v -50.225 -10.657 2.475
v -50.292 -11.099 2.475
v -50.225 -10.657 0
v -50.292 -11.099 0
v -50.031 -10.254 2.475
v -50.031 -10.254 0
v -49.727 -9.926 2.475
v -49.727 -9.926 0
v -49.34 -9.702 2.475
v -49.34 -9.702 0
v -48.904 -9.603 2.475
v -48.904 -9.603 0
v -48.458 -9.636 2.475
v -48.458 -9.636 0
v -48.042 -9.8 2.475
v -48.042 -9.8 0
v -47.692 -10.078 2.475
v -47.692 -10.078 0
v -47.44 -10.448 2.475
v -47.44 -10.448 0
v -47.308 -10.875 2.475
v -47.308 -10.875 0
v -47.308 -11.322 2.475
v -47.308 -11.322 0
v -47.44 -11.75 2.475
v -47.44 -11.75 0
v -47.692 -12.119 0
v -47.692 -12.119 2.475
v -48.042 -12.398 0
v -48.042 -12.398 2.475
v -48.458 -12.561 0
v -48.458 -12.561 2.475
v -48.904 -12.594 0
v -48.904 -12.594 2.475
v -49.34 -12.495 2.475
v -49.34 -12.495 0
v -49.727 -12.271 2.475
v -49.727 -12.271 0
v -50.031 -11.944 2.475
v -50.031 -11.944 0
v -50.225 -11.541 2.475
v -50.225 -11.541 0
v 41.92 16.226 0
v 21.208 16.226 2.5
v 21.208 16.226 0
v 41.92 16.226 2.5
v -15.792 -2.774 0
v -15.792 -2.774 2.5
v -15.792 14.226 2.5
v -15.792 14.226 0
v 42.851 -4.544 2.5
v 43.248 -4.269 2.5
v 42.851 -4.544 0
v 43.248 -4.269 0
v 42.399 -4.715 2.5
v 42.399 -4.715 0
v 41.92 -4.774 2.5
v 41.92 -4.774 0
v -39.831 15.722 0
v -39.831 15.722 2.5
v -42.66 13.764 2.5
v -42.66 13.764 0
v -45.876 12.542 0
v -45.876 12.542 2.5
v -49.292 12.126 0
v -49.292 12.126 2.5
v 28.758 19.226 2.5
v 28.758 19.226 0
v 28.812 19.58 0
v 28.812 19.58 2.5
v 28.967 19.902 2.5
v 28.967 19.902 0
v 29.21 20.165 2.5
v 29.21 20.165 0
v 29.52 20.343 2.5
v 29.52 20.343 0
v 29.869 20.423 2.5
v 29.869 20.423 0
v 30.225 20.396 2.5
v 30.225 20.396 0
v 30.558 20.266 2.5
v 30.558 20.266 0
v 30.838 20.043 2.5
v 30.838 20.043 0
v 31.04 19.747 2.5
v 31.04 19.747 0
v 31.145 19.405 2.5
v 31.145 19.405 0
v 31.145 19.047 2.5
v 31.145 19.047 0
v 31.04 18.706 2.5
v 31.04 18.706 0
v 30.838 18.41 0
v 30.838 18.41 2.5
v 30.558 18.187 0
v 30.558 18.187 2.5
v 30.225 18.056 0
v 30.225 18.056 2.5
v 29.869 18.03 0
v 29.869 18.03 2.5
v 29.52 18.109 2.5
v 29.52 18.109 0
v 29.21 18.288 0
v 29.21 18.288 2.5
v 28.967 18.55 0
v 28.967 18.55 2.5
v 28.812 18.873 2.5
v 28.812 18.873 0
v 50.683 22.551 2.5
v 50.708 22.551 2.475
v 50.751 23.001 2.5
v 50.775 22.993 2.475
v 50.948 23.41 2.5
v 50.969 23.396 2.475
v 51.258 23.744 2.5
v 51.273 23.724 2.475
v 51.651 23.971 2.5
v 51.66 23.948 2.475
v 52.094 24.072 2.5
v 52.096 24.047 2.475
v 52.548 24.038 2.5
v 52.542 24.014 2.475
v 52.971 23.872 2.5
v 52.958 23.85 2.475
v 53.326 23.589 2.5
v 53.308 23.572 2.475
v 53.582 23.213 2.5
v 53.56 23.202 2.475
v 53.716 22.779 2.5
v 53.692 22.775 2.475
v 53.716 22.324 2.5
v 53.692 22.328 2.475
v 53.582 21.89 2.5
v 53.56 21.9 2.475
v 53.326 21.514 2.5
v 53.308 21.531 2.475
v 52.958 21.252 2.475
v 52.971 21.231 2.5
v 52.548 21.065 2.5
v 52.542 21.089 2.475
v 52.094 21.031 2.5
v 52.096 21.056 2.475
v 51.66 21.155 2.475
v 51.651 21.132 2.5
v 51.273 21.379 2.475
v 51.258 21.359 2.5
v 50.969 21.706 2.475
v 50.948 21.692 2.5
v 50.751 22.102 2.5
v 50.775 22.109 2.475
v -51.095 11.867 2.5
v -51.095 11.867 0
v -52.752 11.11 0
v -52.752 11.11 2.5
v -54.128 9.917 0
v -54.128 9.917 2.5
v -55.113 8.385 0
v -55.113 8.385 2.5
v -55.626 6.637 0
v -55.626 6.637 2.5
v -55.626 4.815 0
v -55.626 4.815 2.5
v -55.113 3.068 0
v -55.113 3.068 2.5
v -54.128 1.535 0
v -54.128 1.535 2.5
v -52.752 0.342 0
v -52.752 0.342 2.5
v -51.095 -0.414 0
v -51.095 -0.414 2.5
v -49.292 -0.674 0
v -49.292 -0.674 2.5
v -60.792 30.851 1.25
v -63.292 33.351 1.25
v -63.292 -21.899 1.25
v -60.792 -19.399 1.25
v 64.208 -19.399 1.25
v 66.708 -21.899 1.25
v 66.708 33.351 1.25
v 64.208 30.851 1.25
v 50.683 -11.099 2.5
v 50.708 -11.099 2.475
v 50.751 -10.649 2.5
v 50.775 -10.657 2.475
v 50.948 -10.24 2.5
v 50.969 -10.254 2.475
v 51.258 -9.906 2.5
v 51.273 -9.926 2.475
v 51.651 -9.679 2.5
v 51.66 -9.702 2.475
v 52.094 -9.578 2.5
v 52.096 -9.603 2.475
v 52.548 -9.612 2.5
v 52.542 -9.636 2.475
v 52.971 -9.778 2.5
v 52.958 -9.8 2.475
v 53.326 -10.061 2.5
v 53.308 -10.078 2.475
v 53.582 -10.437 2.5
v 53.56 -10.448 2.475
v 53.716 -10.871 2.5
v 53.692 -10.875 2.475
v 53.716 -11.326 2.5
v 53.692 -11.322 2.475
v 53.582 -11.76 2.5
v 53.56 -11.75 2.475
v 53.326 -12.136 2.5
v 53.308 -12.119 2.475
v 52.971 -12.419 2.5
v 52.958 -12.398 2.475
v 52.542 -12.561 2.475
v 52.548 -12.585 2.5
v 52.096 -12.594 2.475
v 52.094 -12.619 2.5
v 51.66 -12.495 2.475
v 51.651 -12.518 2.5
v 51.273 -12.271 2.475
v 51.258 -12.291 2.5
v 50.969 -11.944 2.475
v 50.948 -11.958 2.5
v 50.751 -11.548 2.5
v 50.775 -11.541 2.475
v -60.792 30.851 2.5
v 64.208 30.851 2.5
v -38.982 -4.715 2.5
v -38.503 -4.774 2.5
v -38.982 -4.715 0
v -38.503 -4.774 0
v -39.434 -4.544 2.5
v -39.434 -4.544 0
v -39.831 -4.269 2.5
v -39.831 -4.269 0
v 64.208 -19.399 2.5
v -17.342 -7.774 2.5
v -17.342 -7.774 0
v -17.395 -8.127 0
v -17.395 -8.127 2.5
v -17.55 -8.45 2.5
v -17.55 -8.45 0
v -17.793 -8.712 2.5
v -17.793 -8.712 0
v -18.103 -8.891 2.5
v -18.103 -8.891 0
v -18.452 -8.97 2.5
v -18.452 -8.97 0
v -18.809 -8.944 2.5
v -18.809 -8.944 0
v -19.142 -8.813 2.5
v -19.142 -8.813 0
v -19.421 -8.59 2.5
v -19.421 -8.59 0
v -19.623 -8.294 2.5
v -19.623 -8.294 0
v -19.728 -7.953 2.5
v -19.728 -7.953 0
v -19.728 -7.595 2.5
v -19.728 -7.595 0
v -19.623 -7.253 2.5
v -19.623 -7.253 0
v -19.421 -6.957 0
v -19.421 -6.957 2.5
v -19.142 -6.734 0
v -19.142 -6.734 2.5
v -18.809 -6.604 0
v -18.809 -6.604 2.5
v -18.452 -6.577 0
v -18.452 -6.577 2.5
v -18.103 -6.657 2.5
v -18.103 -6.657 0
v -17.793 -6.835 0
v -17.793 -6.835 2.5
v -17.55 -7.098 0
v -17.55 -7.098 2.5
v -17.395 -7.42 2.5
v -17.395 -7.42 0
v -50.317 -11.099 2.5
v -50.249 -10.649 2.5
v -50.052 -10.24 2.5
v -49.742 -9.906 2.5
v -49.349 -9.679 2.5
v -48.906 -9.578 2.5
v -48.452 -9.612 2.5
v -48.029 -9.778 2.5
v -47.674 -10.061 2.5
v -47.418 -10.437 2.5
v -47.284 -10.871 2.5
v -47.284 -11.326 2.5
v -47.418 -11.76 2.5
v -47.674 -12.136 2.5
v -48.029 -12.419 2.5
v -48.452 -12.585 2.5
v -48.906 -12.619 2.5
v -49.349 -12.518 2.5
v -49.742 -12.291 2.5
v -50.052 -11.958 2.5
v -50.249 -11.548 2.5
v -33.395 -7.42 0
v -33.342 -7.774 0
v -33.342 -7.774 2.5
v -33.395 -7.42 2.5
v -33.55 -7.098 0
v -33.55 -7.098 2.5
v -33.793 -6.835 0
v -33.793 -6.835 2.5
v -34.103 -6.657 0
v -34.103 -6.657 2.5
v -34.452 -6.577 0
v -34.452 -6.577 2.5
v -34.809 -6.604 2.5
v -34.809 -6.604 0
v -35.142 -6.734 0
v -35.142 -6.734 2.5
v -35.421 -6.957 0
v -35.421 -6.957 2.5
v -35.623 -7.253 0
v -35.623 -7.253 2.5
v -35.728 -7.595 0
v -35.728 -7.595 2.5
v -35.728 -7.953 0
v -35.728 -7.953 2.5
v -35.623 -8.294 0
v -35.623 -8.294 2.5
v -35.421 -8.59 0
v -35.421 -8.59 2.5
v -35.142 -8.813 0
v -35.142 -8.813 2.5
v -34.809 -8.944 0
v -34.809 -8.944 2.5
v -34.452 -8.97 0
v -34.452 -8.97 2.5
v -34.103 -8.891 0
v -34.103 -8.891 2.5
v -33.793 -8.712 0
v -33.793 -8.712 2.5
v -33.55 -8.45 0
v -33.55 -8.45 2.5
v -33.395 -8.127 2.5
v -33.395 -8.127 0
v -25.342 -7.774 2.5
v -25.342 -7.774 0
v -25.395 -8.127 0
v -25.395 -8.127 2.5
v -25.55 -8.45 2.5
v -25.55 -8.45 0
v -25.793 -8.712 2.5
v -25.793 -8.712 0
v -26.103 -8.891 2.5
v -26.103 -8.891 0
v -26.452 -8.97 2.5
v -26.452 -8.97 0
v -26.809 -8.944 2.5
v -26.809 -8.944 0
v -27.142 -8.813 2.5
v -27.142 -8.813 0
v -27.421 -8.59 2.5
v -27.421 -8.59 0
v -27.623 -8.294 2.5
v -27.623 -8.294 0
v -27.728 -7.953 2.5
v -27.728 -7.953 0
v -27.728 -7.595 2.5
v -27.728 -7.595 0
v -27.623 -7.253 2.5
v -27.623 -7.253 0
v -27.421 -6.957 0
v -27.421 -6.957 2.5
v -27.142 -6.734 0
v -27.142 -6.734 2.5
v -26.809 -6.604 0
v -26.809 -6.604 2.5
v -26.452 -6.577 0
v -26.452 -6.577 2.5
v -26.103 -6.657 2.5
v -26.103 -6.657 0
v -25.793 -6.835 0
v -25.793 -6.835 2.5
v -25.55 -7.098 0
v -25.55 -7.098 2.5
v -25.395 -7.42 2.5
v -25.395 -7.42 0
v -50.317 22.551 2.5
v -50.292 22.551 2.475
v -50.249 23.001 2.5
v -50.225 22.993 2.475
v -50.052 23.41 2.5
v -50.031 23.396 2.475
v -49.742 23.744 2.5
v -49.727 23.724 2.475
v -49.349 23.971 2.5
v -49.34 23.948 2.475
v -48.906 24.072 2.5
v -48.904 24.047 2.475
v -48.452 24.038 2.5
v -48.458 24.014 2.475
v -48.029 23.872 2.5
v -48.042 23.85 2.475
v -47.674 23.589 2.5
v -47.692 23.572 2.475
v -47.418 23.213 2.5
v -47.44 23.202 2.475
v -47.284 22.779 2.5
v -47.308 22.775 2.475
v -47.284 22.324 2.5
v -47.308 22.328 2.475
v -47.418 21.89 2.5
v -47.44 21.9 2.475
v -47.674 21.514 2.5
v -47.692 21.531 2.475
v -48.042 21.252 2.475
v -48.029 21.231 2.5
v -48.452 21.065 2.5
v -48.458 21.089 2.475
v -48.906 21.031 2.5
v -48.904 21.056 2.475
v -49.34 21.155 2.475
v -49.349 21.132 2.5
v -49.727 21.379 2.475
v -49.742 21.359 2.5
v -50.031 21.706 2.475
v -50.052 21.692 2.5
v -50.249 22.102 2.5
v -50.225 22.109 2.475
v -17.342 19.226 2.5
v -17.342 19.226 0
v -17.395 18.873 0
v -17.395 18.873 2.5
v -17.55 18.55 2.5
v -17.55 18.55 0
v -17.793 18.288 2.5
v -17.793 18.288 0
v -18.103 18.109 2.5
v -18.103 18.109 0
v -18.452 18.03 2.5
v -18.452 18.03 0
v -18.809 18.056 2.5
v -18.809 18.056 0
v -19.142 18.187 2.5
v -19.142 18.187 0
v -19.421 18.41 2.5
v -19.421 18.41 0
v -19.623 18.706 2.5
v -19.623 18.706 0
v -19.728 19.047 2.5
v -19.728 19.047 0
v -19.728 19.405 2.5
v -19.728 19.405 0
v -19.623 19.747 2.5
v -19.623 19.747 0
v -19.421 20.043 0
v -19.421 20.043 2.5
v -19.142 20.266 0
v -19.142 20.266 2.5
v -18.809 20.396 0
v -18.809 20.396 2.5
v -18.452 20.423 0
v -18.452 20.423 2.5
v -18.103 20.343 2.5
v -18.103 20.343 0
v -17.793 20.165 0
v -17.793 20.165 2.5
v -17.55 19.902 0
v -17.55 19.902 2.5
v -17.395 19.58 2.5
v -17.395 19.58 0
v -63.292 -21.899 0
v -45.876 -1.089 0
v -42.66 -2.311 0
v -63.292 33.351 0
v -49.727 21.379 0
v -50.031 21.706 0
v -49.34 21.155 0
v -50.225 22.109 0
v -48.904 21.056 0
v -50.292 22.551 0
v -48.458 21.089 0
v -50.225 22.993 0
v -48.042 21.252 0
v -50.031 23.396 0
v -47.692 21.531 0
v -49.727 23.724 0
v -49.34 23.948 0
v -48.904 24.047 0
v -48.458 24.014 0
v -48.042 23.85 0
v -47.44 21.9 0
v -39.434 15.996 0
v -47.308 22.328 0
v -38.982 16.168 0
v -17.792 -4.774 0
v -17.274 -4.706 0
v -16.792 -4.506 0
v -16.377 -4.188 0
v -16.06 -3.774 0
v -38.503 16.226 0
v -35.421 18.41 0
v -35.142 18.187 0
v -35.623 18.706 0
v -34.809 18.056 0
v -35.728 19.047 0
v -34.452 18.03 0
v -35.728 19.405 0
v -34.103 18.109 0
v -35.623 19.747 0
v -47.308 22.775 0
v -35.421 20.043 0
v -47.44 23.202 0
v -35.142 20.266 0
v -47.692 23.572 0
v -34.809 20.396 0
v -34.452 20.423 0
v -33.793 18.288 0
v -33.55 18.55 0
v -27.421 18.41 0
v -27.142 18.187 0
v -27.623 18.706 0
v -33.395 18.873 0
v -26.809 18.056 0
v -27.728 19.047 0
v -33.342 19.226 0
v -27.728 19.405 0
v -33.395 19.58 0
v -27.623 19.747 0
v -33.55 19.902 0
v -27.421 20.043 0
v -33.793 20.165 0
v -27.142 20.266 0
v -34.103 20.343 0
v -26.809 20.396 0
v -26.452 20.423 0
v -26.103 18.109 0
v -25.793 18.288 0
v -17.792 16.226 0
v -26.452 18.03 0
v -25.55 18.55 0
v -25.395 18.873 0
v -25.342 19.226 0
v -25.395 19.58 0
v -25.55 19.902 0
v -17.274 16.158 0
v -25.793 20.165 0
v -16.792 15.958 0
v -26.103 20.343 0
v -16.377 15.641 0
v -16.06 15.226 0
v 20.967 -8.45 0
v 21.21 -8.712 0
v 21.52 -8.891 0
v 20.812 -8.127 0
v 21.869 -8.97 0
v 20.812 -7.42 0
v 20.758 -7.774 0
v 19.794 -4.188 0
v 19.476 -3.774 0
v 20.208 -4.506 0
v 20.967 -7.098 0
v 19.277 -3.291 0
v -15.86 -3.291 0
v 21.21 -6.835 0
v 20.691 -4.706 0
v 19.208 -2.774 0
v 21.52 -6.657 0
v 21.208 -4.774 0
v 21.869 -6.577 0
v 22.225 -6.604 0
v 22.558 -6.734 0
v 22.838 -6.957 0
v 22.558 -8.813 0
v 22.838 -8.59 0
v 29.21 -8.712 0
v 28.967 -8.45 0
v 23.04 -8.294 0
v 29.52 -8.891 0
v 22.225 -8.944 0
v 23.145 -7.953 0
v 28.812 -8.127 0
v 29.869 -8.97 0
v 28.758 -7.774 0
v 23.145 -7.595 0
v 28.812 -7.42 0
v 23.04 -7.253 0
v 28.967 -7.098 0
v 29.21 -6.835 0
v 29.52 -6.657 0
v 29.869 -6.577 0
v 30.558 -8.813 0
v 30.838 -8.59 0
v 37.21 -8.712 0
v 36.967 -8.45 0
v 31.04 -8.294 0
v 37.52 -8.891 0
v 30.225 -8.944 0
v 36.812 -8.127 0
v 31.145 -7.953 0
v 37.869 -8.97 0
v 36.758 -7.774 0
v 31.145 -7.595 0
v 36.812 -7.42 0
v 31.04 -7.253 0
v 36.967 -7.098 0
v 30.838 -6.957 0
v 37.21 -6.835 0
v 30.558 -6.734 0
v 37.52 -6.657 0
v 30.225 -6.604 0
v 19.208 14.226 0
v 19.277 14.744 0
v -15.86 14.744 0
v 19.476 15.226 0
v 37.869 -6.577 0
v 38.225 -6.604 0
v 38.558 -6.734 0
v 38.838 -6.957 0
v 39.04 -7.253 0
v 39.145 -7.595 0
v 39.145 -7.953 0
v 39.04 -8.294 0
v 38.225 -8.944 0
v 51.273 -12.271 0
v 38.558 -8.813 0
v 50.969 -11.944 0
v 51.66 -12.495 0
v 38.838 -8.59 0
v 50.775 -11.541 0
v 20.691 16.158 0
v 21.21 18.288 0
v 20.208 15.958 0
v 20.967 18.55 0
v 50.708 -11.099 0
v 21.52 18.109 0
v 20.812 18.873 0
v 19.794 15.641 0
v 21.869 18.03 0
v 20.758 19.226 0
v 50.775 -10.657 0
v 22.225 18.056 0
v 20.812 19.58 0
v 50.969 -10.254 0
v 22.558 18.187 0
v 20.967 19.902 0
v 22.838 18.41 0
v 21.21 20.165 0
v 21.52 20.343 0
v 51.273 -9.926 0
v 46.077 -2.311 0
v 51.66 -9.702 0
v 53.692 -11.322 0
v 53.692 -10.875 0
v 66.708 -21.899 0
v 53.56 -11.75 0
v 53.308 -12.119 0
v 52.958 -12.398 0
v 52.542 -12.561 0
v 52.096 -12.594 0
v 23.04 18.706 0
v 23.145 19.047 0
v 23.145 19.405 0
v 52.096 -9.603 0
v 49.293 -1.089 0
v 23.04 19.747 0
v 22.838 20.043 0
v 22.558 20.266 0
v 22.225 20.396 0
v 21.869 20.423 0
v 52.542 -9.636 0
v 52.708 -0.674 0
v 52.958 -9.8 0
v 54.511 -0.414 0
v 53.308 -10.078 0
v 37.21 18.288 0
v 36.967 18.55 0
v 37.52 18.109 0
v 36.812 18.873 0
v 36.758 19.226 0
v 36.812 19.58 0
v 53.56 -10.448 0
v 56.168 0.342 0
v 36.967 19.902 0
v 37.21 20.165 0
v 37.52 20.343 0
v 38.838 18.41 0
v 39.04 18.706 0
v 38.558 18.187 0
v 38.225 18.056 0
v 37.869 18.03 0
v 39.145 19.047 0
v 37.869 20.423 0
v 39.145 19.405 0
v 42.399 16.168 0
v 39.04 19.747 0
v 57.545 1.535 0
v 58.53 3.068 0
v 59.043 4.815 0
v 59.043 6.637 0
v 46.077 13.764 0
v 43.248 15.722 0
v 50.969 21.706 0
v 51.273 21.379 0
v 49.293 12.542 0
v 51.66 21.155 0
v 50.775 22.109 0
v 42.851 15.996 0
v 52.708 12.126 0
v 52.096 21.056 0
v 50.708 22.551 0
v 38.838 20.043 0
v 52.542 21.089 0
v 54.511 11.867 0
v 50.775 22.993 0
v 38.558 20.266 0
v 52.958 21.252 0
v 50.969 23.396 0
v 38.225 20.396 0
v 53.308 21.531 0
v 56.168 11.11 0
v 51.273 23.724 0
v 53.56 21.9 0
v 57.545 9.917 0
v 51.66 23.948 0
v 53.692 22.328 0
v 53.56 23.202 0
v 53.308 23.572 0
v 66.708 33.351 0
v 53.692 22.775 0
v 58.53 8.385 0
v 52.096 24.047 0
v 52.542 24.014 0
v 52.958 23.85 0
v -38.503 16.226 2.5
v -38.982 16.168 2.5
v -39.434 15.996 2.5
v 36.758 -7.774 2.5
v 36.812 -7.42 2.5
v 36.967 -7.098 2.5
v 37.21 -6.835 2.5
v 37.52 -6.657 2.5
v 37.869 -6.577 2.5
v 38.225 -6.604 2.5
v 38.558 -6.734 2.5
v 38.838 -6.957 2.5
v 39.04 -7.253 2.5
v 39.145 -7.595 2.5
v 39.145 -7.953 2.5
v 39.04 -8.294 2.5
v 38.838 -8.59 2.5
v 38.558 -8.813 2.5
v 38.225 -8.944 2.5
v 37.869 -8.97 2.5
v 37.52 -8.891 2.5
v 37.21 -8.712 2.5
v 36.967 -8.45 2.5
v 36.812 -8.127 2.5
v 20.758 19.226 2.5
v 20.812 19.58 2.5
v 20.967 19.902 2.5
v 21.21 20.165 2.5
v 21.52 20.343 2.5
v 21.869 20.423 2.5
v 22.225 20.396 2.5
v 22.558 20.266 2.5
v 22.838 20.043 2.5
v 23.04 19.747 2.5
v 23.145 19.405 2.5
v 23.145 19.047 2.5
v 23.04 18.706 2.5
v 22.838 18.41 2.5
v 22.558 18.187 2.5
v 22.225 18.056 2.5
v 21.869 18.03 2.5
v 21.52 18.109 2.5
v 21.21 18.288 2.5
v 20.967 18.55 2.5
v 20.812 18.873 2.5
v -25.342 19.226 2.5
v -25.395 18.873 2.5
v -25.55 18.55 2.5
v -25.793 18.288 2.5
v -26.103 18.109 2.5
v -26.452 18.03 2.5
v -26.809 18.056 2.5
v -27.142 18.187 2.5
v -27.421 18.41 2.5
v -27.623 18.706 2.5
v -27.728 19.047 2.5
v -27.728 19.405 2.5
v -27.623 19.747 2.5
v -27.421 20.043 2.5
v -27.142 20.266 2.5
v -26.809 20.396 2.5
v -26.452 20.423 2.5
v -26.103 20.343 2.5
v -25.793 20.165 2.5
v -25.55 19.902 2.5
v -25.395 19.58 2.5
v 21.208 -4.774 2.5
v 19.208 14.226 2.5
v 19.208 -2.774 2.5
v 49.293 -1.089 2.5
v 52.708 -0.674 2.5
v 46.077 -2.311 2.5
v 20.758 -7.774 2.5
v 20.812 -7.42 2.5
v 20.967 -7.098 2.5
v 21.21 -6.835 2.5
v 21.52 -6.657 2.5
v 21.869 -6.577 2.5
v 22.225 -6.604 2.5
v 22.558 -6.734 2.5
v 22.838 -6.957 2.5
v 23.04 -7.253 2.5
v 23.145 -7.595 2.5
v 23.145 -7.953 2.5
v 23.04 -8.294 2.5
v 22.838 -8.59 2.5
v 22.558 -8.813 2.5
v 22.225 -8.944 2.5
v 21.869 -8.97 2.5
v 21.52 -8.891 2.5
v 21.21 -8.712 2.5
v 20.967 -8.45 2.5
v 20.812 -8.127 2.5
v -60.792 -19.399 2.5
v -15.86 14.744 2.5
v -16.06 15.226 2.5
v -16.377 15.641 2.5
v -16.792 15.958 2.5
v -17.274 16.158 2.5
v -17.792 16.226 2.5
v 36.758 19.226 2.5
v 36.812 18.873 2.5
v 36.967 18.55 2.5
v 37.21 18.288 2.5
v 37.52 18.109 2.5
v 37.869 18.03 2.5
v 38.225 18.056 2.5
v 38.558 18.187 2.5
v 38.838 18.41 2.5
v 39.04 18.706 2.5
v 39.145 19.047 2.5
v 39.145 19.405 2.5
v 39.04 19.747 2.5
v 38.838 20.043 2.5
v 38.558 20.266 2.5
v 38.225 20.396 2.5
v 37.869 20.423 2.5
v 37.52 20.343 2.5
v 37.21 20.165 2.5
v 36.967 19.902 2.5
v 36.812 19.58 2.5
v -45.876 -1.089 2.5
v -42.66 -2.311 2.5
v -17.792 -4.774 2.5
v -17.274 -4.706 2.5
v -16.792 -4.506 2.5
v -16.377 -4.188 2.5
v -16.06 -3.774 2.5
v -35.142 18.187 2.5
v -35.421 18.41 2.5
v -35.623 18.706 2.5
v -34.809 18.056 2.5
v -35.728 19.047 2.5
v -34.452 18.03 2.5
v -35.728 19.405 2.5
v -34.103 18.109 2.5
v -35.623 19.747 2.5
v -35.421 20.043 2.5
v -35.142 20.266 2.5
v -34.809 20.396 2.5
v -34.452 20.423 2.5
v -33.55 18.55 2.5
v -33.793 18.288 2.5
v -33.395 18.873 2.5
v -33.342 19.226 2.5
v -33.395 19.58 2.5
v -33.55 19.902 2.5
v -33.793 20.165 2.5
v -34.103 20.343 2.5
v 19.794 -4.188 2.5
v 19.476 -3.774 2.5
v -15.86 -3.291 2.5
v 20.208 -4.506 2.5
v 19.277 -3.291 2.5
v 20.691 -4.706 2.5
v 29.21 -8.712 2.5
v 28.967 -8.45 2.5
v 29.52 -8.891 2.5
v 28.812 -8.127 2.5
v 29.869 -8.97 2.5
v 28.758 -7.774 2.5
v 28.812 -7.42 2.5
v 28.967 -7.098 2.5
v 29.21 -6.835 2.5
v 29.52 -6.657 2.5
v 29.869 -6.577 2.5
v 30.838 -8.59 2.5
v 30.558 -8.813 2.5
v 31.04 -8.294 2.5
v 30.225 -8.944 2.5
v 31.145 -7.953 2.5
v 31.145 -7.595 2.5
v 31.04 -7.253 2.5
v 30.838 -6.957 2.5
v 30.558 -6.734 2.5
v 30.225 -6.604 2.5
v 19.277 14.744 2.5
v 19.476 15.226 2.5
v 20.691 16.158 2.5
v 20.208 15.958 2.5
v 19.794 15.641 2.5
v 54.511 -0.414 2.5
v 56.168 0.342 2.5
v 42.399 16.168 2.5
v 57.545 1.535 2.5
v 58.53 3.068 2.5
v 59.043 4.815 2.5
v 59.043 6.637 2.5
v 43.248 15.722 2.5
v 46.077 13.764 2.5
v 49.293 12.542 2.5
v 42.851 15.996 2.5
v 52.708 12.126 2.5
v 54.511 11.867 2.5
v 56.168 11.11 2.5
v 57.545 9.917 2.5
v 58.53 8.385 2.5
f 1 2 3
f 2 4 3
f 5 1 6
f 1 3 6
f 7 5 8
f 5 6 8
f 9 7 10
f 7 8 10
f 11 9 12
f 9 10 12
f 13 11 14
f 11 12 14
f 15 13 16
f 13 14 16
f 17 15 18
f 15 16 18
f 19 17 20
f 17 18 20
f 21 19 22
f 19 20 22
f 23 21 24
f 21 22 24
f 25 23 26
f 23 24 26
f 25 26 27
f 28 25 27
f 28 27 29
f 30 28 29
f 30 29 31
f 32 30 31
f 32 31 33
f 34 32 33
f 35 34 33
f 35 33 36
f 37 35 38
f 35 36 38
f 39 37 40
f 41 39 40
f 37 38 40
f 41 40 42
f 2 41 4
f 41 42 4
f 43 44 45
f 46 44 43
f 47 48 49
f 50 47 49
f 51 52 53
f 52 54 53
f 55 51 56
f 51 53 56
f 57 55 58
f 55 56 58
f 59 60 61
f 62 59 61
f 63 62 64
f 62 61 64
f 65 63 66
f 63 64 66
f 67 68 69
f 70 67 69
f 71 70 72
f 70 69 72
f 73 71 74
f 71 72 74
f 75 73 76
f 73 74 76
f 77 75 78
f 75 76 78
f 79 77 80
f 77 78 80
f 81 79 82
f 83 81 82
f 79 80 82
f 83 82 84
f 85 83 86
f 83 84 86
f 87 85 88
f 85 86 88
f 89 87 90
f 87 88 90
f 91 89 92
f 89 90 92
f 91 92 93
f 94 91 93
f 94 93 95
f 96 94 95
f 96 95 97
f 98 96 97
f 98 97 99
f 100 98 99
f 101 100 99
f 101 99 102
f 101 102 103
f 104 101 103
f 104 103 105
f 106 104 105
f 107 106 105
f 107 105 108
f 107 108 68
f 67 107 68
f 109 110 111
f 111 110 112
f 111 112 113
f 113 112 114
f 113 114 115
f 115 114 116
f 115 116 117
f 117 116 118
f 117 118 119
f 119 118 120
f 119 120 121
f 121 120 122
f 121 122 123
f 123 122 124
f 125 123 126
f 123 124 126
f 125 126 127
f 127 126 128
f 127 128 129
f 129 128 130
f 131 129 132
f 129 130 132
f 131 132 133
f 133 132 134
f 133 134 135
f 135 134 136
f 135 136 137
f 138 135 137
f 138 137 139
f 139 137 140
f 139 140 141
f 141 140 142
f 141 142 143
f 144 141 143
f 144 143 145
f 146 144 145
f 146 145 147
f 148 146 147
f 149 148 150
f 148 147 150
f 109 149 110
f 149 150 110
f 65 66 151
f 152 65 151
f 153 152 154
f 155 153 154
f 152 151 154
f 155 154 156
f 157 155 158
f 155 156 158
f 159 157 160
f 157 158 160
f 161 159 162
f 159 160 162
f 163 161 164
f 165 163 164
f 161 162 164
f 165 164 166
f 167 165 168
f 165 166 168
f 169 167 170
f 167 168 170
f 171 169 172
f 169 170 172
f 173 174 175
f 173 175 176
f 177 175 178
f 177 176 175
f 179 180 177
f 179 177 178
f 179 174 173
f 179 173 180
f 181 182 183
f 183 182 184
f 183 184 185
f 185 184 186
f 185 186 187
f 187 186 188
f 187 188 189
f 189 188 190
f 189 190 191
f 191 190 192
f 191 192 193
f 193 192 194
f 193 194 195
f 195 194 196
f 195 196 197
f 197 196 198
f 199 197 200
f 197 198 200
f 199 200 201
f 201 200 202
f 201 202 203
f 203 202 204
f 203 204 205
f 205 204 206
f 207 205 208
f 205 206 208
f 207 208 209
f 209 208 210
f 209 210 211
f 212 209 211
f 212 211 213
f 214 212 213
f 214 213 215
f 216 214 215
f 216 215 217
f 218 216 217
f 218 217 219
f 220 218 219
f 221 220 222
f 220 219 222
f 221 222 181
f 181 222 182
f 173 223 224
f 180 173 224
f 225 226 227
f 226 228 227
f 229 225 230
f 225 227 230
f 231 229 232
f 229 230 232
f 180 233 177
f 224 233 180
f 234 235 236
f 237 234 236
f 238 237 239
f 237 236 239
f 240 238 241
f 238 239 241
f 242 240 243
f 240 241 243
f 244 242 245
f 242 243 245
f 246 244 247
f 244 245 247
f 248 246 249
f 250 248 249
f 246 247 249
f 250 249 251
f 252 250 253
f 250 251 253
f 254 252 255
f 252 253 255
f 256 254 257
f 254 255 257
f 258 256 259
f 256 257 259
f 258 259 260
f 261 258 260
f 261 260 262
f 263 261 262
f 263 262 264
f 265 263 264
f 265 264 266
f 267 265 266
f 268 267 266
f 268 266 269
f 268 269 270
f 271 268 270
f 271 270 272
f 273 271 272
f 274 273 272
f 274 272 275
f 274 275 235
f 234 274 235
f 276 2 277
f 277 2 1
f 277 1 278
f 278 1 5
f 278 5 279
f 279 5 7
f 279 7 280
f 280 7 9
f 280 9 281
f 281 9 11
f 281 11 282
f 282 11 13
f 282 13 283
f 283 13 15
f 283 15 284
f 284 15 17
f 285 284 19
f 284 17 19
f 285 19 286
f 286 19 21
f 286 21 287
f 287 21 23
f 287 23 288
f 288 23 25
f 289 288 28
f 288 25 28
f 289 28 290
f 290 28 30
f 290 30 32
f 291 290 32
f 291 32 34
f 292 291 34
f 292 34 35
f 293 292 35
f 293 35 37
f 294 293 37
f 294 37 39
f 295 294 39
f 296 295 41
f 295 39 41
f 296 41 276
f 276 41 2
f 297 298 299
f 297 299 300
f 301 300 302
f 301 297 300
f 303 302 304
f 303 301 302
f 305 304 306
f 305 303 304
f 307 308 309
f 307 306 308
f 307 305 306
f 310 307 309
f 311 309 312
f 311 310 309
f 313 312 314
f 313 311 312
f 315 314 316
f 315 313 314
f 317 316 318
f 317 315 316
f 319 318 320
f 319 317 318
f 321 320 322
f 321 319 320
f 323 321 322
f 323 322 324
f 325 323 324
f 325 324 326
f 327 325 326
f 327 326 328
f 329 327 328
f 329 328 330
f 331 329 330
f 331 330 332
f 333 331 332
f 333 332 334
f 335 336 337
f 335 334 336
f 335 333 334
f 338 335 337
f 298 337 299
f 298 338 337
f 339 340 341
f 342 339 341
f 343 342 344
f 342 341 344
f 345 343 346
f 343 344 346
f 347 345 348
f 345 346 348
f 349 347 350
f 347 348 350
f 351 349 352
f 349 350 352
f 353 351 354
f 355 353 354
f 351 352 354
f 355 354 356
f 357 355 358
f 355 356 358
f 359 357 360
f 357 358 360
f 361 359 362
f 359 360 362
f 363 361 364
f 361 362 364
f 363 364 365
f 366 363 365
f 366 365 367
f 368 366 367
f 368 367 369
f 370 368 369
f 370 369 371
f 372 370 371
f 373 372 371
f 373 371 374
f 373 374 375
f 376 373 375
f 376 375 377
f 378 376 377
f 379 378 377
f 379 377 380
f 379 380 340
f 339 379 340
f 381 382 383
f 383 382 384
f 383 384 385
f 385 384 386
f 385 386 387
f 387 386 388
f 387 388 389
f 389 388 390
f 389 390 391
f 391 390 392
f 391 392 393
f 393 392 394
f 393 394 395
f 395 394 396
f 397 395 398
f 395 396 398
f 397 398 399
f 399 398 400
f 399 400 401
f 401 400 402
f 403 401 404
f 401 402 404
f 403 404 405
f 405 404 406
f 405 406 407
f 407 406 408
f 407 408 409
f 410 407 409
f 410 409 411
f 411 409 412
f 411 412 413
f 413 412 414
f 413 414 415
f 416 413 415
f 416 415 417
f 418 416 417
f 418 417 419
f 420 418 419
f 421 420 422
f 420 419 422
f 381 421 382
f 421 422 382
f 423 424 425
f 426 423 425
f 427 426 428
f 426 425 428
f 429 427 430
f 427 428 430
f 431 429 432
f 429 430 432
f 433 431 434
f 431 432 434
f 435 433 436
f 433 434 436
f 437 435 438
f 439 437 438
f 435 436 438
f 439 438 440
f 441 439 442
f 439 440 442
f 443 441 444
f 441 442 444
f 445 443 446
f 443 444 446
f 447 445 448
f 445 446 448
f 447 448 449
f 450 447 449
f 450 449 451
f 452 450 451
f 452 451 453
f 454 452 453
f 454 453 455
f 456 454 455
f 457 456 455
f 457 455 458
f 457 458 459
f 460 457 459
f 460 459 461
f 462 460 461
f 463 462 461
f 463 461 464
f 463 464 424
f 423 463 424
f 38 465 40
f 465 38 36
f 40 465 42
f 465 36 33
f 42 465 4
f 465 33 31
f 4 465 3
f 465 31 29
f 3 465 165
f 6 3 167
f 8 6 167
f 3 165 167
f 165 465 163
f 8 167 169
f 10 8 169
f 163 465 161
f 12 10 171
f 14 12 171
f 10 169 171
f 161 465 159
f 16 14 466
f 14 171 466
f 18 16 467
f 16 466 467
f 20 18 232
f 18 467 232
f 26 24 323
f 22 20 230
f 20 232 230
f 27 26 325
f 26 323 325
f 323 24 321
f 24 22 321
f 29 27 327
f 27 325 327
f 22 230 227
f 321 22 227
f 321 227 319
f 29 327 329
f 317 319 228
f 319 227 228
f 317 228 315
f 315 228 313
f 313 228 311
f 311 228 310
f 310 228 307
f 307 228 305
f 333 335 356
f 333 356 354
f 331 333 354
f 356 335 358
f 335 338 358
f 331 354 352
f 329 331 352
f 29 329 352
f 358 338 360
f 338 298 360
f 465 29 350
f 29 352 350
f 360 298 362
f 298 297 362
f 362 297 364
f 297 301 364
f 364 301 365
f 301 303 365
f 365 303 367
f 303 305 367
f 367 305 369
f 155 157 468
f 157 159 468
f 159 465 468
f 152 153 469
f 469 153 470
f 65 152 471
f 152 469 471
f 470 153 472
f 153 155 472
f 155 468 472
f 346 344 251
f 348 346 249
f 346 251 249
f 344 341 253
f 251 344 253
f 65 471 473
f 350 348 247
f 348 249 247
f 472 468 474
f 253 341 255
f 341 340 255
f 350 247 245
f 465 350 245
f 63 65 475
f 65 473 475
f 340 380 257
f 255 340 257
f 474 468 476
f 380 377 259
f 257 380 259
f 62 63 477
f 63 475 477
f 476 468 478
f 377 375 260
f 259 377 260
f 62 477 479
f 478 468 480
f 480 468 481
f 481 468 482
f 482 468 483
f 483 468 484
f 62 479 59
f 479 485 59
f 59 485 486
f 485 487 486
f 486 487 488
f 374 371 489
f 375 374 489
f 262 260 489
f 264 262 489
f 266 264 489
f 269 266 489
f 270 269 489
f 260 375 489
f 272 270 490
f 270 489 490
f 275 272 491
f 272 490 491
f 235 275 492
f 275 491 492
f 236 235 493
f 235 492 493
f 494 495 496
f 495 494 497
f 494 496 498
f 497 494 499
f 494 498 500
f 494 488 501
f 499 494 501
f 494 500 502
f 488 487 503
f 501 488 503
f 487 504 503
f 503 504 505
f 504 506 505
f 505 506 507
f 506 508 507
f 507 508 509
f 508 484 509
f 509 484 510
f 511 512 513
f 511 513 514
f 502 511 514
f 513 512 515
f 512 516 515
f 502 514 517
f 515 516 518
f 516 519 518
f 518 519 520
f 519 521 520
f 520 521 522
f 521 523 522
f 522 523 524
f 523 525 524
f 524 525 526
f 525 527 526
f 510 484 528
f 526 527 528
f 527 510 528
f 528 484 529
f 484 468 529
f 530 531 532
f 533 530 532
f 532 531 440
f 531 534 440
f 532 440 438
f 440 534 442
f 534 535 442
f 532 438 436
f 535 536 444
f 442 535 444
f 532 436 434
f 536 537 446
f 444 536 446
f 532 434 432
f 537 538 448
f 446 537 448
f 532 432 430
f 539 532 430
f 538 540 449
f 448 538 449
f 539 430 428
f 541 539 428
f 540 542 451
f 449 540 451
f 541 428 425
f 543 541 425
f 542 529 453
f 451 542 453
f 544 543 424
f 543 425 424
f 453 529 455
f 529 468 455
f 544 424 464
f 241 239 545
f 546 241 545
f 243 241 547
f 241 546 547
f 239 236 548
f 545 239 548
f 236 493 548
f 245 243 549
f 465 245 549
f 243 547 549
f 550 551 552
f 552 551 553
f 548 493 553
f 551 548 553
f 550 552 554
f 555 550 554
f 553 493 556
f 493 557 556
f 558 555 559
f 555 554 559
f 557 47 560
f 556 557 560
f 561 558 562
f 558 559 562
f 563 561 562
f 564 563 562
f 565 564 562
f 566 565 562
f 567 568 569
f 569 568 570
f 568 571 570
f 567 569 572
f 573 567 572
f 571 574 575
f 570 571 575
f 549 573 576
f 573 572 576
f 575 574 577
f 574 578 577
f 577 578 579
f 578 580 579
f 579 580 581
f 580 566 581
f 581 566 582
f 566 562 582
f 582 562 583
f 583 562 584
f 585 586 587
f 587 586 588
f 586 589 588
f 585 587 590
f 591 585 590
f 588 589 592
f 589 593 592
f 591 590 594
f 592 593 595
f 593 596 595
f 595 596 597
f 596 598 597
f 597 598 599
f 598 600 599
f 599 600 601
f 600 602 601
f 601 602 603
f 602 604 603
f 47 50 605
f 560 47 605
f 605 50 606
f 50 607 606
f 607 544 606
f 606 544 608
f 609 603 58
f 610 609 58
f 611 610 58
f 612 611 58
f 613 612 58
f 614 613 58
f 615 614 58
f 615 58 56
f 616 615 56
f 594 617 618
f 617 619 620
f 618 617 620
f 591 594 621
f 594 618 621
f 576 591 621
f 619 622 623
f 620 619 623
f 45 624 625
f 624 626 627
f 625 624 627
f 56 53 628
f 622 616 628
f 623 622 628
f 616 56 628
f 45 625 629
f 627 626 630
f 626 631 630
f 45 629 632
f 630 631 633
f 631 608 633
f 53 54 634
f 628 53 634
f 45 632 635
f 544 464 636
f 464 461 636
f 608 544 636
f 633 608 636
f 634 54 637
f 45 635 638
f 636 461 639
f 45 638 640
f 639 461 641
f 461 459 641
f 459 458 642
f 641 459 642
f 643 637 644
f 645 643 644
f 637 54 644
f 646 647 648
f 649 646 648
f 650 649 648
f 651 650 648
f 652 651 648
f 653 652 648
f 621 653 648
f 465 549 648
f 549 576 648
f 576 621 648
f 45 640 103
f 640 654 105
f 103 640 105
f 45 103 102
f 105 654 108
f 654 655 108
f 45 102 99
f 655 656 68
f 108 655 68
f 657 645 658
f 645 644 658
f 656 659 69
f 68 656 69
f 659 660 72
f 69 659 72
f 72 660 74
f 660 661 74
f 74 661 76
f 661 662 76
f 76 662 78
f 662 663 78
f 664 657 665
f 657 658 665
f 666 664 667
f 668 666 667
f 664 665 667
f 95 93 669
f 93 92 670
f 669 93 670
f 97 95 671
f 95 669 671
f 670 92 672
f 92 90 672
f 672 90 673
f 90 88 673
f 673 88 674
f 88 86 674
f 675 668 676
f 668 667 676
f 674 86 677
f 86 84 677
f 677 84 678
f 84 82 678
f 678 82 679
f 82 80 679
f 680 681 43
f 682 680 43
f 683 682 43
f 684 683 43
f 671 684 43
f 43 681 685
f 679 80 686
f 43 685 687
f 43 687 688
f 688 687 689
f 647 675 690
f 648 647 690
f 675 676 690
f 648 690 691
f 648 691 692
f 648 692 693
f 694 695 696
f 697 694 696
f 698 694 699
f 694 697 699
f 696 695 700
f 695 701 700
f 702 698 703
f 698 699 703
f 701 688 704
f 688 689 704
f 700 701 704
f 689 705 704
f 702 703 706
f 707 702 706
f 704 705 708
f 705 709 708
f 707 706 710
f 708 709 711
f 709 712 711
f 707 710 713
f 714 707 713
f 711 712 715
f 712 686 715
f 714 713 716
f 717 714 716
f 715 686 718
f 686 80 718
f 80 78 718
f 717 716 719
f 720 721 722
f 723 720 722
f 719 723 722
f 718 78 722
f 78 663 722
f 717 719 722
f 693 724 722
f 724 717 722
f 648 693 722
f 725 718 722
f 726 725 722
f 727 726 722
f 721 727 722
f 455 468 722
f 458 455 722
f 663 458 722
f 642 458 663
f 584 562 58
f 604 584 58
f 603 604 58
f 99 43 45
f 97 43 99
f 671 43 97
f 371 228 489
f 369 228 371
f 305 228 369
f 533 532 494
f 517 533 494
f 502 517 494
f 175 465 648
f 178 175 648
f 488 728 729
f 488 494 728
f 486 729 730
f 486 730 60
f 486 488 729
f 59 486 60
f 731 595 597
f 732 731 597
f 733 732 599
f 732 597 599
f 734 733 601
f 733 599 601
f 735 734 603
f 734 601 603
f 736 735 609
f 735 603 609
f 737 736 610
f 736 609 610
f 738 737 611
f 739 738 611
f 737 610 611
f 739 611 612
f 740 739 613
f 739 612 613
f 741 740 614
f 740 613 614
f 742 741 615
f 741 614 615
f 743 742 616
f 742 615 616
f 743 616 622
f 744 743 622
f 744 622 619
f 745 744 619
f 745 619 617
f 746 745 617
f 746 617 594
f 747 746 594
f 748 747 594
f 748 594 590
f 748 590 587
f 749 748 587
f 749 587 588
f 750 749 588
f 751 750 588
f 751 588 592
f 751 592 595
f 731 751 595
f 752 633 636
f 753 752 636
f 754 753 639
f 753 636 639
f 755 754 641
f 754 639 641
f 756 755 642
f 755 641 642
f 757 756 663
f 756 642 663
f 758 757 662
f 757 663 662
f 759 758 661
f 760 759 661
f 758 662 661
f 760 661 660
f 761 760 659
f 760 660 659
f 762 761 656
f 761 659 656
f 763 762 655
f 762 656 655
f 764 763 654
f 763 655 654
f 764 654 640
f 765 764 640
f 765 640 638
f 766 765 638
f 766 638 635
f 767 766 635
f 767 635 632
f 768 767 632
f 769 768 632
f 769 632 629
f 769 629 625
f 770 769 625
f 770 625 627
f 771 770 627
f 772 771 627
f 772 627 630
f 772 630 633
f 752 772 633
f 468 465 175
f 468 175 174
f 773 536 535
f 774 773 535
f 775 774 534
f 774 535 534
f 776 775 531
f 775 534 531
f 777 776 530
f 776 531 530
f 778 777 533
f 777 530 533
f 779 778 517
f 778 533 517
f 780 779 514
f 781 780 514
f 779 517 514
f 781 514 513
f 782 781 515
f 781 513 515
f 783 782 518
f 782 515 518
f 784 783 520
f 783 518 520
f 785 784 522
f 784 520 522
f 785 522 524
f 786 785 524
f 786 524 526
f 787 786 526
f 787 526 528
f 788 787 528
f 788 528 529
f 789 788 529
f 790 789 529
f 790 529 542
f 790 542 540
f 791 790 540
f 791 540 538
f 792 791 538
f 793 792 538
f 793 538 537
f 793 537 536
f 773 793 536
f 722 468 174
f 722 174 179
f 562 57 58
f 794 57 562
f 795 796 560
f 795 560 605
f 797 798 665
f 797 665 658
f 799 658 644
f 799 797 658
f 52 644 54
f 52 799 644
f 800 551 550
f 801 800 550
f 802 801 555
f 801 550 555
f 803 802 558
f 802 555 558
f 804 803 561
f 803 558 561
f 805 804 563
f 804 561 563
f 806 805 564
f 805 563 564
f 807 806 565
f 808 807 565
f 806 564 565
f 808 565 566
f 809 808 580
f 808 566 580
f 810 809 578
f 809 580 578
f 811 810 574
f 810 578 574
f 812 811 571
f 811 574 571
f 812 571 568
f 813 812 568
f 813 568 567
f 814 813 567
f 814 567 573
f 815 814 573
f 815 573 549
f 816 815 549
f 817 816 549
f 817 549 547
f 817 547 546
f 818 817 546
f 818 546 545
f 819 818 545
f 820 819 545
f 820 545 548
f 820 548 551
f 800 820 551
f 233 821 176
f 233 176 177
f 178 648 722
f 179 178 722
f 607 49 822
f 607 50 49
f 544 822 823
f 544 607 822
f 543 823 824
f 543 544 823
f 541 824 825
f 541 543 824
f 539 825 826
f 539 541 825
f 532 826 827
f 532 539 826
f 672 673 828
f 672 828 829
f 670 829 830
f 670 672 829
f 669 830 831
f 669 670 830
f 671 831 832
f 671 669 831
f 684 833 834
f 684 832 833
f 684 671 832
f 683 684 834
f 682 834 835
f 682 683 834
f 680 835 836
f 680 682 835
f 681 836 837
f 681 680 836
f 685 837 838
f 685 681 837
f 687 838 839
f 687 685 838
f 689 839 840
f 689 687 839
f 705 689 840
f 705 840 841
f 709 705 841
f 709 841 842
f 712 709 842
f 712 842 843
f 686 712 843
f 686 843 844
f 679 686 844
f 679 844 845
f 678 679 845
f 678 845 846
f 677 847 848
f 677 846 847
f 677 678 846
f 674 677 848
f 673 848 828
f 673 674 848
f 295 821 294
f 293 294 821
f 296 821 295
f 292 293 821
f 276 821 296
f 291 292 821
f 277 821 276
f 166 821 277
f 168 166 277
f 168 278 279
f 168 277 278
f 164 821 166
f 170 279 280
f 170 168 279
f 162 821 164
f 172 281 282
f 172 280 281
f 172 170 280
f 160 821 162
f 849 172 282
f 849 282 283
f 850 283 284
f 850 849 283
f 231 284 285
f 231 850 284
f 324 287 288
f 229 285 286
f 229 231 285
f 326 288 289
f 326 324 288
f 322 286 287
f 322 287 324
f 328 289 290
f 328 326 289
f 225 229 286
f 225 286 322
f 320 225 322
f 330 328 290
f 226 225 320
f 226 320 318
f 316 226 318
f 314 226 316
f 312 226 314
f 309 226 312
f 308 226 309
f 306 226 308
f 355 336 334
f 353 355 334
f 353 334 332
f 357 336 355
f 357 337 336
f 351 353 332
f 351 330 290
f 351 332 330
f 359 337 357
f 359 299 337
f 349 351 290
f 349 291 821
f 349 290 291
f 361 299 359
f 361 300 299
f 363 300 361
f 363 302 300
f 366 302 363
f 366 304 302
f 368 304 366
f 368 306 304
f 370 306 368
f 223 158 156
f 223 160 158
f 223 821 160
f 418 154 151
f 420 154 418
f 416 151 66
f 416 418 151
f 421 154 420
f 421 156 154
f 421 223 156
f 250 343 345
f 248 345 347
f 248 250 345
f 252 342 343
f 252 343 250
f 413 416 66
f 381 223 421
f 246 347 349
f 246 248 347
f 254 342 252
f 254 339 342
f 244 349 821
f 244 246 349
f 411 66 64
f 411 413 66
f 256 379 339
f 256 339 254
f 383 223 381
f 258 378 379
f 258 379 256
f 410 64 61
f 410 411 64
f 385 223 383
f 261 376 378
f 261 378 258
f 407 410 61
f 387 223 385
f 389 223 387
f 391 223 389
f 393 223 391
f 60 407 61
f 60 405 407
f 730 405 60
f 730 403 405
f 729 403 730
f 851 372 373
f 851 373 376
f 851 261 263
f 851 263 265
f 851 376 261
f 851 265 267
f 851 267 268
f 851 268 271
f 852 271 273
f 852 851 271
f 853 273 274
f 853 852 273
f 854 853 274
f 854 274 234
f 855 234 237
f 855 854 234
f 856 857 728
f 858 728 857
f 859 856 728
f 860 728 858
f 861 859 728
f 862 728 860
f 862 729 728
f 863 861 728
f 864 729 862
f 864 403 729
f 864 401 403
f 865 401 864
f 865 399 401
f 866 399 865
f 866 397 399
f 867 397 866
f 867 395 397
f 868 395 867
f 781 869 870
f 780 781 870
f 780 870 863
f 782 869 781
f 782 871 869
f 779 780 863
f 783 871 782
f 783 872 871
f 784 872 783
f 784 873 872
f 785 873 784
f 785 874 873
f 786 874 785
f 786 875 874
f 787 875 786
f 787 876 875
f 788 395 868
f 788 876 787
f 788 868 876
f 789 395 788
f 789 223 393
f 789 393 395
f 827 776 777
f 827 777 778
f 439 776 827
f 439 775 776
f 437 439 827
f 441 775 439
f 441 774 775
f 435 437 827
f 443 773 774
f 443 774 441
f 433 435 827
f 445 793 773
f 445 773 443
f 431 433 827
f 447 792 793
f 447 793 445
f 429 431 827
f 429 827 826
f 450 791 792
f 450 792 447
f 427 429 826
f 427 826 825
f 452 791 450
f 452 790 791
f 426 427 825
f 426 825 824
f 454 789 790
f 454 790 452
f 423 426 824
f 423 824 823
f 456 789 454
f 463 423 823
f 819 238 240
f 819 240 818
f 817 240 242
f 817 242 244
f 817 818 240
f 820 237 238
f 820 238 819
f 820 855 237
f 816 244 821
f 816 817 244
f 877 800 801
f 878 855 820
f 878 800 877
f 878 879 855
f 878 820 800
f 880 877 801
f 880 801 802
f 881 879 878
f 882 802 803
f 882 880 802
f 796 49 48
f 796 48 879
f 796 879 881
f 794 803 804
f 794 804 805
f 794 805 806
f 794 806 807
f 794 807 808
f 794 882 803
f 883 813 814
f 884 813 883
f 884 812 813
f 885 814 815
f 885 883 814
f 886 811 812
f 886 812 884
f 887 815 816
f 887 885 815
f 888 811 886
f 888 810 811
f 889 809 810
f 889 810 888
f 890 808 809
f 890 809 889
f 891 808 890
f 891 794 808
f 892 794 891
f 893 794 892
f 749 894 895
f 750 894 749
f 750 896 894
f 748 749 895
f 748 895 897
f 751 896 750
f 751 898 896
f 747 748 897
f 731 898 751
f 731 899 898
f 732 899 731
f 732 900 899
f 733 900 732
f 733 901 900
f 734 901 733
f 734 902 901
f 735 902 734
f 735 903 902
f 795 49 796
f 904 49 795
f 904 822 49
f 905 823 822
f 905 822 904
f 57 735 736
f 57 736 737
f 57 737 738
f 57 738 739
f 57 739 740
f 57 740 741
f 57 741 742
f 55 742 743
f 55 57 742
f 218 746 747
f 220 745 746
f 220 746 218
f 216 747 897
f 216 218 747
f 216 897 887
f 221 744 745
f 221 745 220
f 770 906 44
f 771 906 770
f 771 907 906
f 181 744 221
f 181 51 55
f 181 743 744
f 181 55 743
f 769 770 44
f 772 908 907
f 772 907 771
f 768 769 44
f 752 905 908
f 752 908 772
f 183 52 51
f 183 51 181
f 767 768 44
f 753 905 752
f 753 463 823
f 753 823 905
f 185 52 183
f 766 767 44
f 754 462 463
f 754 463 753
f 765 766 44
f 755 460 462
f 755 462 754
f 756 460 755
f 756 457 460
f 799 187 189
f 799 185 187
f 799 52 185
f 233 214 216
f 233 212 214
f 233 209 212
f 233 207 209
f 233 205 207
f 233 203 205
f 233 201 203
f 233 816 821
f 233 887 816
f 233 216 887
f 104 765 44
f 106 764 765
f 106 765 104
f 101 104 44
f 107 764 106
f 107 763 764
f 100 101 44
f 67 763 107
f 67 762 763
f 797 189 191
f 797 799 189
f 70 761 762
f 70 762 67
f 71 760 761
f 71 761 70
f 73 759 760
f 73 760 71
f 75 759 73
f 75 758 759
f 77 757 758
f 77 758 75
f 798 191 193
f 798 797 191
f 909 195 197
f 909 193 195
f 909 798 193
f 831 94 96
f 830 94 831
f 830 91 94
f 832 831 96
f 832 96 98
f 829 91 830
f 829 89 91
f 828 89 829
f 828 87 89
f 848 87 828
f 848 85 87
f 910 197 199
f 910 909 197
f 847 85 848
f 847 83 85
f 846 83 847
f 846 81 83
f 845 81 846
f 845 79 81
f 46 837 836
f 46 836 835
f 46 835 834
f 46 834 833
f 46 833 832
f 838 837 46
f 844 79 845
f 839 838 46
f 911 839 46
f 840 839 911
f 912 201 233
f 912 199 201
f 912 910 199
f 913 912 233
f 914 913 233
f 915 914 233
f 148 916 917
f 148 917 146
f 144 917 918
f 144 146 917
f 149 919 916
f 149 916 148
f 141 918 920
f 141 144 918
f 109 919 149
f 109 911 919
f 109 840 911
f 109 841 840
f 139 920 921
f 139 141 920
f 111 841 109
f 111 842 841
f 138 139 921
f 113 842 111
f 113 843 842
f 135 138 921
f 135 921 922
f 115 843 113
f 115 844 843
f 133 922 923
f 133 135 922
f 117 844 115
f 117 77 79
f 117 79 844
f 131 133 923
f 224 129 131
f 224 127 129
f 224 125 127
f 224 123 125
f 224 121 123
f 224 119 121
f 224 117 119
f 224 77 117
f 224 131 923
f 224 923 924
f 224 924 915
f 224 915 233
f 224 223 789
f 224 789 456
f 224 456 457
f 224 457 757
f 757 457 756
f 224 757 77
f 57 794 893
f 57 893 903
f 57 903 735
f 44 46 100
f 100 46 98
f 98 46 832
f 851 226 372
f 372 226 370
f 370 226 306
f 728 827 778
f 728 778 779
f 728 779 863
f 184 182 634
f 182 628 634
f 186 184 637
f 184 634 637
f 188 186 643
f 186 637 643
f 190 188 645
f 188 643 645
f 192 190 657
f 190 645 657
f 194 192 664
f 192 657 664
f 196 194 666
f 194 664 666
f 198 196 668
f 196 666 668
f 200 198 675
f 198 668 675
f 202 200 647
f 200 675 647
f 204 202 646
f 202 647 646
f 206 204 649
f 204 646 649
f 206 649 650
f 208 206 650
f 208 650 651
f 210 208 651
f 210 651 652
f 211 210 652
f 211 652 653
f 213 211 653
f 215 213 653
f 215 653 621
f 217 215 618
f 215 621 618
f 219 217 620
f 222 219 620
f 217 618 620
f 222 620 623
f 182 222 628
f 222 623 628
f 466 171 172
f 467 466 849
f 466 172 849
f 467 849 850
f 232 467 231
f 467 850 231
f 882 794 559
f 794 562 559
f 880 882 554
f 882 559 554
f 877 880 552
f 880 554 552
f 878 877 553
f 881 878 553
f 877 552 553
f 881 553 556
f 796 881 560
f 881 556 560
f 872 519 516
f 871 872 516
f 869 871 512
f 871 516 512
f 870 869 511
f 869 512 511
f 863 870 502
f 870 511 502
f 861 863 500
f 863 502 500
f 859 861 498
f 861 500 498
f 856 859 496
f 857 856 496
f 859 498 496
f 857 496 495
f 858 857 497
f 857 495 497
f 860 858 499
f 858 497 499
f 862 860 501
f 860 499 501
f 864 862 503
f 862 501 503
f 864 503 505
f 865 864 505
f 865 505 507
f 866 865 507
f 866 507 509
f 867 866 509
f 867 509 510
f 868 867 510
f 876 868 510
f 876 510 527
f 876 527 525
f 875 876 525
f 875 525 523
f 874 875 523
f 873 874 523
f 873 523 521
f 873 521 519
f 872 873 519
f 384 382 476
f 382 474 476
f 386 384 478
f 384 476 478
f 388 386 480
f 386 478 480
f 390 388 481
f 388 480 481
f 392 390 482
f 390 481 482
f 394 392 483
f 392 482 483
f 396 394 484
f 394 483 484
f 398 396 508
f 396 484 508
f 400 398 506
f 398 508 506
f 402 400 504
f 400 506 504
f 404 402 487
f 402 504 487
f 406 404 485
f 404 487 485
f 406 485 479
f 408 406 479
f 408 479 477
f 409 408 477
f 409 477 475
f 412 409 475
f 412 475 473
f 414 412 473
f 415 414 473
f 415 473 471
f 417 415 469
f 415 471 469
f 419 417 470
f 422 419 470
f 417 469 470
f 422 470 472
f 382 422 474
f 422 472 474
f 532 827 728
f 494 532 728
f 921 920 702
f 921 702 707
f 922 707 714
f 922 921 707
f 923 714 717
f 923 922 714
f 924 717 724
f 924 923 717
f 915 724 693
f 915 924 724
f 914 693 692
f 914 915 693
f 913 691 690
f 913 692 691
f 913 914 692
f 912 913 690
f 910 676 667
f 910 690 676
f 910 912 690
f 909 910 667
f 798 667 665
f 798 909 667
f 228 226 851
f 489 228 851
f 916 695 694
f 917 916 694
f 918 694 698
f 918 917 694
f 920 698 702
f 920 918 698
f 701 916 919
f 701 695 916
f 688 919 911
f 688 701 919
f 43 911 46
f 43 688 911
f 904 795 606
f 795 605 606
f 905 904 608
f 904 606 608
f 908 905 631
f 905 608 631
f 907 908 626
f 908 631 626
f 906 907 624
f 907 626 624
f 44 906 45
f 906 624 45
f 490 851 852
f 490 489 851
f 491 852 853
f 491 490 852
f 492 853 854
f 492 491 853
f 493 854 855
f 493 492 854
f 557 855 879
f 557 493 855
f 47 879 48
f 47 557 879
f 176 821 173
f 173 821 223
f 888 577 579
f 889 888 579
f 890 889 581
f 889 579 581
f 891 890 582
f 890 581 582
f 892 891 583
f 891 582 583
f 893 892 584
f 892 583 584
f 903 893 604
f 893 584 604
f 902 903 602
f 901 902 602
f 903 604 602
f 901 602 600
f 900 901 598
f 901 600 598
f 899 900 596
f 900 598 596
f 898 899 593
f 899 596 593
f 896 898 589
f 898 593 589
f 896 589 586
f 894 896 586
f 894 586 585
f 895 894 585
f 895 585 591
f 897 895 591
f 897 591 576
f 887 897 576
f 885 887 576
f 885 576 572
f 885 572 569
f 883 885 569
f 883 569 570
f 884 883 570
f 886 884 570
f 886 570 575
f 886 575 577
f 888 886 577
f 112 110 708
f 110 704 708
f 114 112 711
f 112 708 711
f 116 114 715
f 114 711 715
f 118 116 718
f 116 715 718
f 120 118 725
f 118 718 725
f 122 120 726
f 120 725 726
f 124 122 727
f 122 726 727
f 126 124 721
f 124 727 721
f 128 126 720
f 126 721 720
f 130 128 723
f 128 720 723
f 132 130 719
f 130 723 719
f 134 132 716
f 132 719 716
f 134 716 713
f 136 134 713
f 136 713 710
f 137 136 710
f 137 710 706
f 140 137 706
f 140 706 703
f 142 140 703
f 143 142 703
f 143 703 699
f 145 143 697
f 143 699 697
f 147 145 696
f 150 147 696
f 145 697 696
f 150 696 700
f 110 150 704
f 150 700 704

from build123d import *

# Parameters (mm, degrees)
ESBO_O1_W                         = 130
ESBO_O1_H                         = 55.25
RESSALTO_EXTRUS_O1_DEPTH          = 2.5
ESBO_O2_W                         = 130
ESBO_O2_H                         = 55.25
ESBO_O2_W_2                       = 125
ESBO_O2_H_2                       = 50.25
CORTE_EXTRUS_O1_DEPTH             = 1.25
FUROS_GUIA_COM_3_0MM2_D           = 3
FUROS_GUIA_COM_3_0MM2_CSINK_D     = 3.05
FUROS_GUIA_COM_3_0MM2_CSINK_ANGLE = 90
CUT_EXTRUDE1_DEPTH                = 10
FILETE1_R                         = 2
FURO_COM_FOLGA_DE_M21_D           = 2.4
PADR_O_LINEAR1_COUNT              = 3
PADR_O_LINEAR1_PITCH              = 8
ESPELHAR1_COPY_1_D                = 2.4
ESPELHAR1_COPY_2_D                = 2.4
ESPELHAR2_COPY_1_D                = 2.4
ESPELHAR2_COPY_2_D                = 2.4
ESPELHAR2_COPY_3_D                = 2.4
ESPELHAR2_COPY_4_D                = 2.4
ESPELHAR2_COPY_5_D                = 2.4
FILETE1_OF_ESPELHAR2_R            = 2


with BuildPart() as part:
    # Esboço1 → Ressalto-extrusão1 (new body)
    with BuildSketch(Plane.XY):
        with Locations((1.708397535, 5.726309707)):
            Rectangle(ESBO_O1_W, ESBO_O1_H)
    extrude(amount=RESSALTO_EXTRUS_O1_DEPTH)

    # Esboço2 → Corte-extrusão1 (cut)
    with BuildSketch(Plane.XY.offset(2.5)):
        with Locations((1.708397535, 5.726309707)):
            Rectangle(ESBO_O2_W, ESBO_O2_H)
        with Locations((1.708397535, 5.726309707)):
            Rectangle(ESBO_O2_W_2, ESBO_O2_H_2, mode=Mode.SUBTRACT)
    extrude(amount=-CORTE_EXTRUS_O1_DEPTH, mode=Mode.SUBTRACT)

    # Furos-guia com Ø3.0mm2 (through all)
    with Locations(Plane.XY.offset(2.5)):
        with Locations((-48.791602465, 22.551309707), (-48.791602465, -11.098690293), (52.208397535, -11.098690293), (52.208397535, 22.551309707)):
            CounterSinkHole(FUROS_GUIA_COM_3_0MM2_D / 2, FUROS_GUIA_COM_3_0MM2_CSINK_D / 2, counter_sink_angle=FUROS_GUIA_COM_3_0MM2_CSINK_ANGLE)

    # Sketch1 → Cut-Extrude1 (cut)
    with BuildSketch(Plane.XY.offset(2.5)):
        with BuildLine():
            Line((-39.291602465, -4.773695916), (-15.791602465, -4.773695916))
            Line((-15.791602465, -4.773695916), (-15.791602465, 16.226304084))
            Line((-15.791602465, 16.226304084), (-39.291602465, 16.226304084))
            ThreePointArc((-39.291602465, 16.226304084), (-43.887668713, 13.19109981), (-49.291602465, 12.126304084))
            ThreePointArc((-49.291602465, 12.126304084), (-55.691602465, 5.726304084), (-49.291602465, -0.673695916))
            ThreePointArc((-49.291602465, -0.673695916), (-43.887668713, -1.738491642), (-39.291602465, -4.773695916))
        make_face()
    cut_extrude1 = extrude(amount=-CUT_EXTRUDE1_DEPTH, mode=Mode.SUBTRACT)

    # Filete1
    filete1_edges = [part.edges().sort_by_distance(p)[0] for p in [
        (-39.291602465, -4.773695916, 1.25),
        (-39.291602465, 16.226304084, 1.25),
        (-15.791602465, 16.226304084, 1.25),
        (-15.791602465, -4.773695916, 1.25),
    ]]
    fillet(filete1_edges, radius=FILETE1_R)

    # Furo com folga de M21 (through all)
    with Locations(Plane.XY.offset(2.5)):
        with Locations((37.958397535, -7.773690293)):
            furo_com_folga_de_m21 = Hole(FURO_COM_FOLGA_DE_M21_D / 2)

    # Padrão linear1: Furo com folga de M21 ×3
    with Locations(*[(-i * PADR_O_LINEAR1_PITCH, 0, 0) for i in range(1, PADR_O_LINEAR1_COUNT)]):
        add(furo_com_folga_de_m21, mode=Mode.SUBTRACT)

    # Espelhar1: Furo com folga de M21 across plane
    add(furo_com_folga_de_m21.mirror(Plane(origin=(0, 5.726309707, 0), x_dir=(0, 0, 1), z_dir=(0, -1, 0))), mode=Mode.SUBTRACT)

    # Espelhar1 copy 1 (through all)
    with Locations(Plane(origin=(-8, 11.452619414, 2.5), x_dir=(1, 0, 0), z_dir=(0, 0, 1))):
        with Locations((37.958397535, 7.773690293)):
            Hole(ESPELHAR1_COPY_1_D / 2)

    # Espelhar1 copy 2 (through all)
    with Locations(Plane(origin=(-16, 11.452619414, 2.5), x_dir=(1, 0, 0), z_dir=(0, 0, 1))):
        with Locations((37.958397535, 7.773690293)):
            Hole(ESPELHAR1_COPY_2_D / 2)

    # Espelhar2: Cut-Extrude1, Furo com folga de M21 across plane
    add(cut_extrude1.mirror(Plane(origin=(1.708397535, 0, 0), x_dir=(0, 0, 1), z_dir=(1, 0, 0))), mode=Mode.SUBTRACT)
    add(furo_com_folga_de_m21.mirror(Plane(origin=(1.708397535, 0, 0), x_dir=(0, 0, 1), z_dir=(1, 0, 0))), mode=Mode.SUBTRACT)

    # Espelhar2 copy 1 (through all)
    with Locations(Plane(origin=(11.416795069, 0, 2.5), x_dir=(-1, 0, 0), z_dir=(0, 0, 1))):
        with Locations((37.958397535, 7.773690293)):
            Hole(ESPELHAR2_COPY_1_D / 2)

    # Espelhar2 copy 2 (through all)
    with Locations(Plane(origin=(19.416795069, 0, 2.5), x_dir=(-1, 0, 0), z_dir=(0, 0, 1))):
        with Locations((37.958397535, 7.773690293)):
            Hole(ESPELHAR2_COPY_2_D / 2)

    # Espelhar2 copy 3 (through all)
    with Locations(Plane(origin=(3.416795069, 11.452619414, 2.5), x_dir=(-1, 0, 0), z_dir=(0, 0, 1))):
        with Locations((37.958397535, -7.773690293)):
            Hole(ESPELHAR2_COPY_3_D / 2)

    # Espelhar2 copy 4 (through all)
    with Locations(Plane(origin=(11.416795069, 11.452619414, 2.5), x_dir=(-1, 0, 0), z_dir=(0, 0, 1))):
        with Locations((37.958397535, -7.773690293)):
            Hole(ESPELHAR2_COPY_4_D / 2)

    # Espelhar2 copy 5 (through all)
    with Locations(Plane(origin=(19.416795069, 11.452619414, 2.5), x_dir=(-1, 0, 0), z_dir=(0, 0, 1))):
        with Locations((37.958397535, -7.773690293)):
            Hole(ESPELHAR2_COPY_5_D / 2)

    # Filete1 of Espelhar2
    filete1_of_espelhar2_edges = [part.edges().sort_by_distance(p)[0] for p in [
        (42.708397535, -4.773695916, 1.25),
        (42.708397535, 16.226304084, 1.25),
        (19.208397535, 16.226304084, 1.25),
        (19.208397535, -4.773695916, 1.25),
    ]]
    fillet(filete1_of_espelhar2_edges, radius=FILETE1_OF_ESPELHAR2_R)


solid = part.part
